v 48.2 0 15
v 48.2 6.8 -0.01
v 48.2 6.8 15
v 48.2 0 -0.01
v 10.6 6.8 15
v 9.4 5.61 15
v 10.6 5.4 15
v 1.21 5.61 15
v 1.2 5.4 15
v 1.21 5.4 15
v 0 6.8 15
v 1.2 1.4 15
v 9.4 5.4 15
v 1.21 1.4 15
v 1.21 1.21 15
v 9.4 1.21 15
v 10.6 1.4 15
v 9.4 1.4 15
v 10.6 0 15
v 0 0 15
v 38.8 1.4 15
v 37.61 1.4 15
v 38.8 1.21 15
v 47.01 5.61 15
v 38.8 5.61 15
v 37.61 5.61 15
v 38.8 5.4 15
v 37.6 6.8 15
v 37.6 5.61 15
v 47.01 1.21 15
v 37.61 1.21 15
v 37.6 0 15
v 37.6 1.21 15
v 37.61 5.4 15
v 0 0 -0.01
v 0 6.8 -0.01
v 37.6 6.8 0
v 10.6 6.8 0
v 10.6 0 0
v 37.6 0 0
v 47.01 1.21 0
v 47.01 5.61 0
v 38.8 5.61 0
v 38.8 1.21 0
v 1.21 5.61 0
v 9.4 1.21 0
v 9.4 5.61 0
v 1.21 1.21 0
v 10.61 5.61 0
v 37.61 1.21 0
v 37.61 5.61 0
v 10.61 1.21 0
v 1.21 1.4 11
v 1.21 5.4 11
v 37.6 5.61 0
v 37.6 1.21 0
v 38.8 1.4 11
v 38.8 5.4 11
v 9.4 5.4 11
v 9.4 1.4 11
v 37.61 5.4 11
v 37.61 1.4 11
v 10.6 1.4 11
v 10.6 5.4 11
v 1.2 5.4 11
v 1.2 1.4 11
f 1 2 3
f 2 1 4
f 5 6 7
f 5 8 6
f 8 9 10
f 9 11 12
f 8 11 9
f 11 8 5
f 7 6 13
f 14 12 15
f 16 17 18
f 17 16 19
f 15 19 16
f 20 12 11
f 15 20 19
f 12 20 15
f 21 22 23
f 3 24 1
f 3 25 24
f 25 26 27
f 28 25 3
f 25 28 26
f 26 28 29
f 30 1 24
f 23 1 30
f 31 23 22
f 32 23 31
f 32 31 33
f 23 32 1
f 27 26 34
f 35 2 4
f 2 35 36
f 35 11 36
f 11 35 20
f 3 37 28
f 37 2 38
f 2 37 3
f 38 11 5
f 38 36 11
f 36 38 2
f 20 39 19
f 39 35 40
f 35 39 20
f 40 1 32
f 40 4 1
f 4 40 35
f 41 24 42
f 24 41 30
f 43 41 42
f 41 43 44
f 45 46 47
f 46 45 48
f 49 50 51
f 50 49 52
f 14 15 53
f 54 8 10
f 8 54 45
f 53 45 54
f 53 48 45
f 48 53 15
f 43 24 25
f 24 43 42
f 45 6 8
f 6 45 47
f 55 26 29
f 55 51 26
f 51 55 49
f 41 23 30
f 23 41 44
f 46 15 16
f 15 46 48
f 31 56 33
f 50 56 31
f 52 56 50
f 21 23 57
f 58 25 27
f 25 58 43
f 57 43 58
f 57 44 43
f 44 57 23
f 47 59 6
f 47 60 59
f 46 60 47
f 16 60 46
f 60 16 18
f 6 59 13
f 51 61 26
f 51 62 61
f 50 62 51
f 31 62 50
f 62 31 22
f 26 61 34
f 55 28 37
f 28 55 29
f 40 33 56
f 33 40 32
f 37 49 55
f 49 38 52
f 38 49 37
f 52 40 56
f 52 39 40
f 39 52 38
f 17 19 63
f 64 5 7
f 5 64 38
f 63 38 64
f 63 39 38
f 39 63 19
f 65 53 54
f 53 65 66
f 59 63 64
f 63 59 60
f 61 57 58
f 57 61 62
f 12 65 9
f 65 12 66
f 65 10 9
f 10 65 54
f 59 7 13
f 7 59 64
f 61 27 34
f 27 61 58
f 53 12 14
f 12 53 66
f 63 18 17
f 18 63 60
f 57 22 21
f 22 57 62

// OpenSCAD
// file: ../Base/Boxes.scad
// Fischertechnik Box Foundation
// Pre-designed Boxes

use <Constants.scad>

include <PlacementOptions.scad>

box190Width = 190;
box190Depth = 130;
box130Width = 130;
box130Depth = 95;

// Values are from an original ec3 box
topBottomDifference = 1.5;
outerHeight = 40;
baseThickness = 1.8;
innerHeight = outerHeight - baseThickness;
stackExcess = 5.7;
radius = 3.5;
wallThickness = 1.5;
tolerance = 0.2;

boxWallThickness = wallThickness;
boxBaseThickness = baseThickness;
boxWebWidth = 3.0;

// getBoxWallThickness()
// Gets the wall thickness of a Fischertechnik Box
function getBoxWallThickness() = boxWallThickness;

// getBoxUsageHeight(height = 38.2)
// Gets the usable height of a Fischertechnik box
// height = Outer height of the box from the bottom to the upper edge.
function getBoxUsageHeight(height = outerHeight) = height - baseThickness - stackExcess;

// getBoxInnerHeight()
// Gets the inner height of a Fischertechnik box, including the stack excess
function getBoxInnerHeight() = innerHeight;

// getBoxBaseThickness()
// Gets the thickness of the Fischertechnik box base.
function getBoxBaseThickness() = boxBaseThickness;

// getBoxWebWidth()
// Gets the width of a box web
function getBoxWebWidth() = boxWebWidth;

// getBox190Space()
// Gets the usable inner space of a Box 190 as an x/y-list
function getBox190Space() = [
    box190Width - 2*getBoxWallThickness() - topBottomDifference, 
    box190Depth - 2*getBoxWallThickness() - topBottomDifference ];

// RoundedCornerPlate(width, depth, height, radius)
// Creates a body plate with rounded corners for a box. Used
// also to create the complete box with the hull module.
// width = Width of the plate
// depth = depth of the plate 
// height = thickness of the plate
// radius = radius of the rounded corner
module RoundedCornerPlate(width, depth, height, radius) {
    translate([radius, radius])
    hull() {
        w = width-2*radius;
        d = depth-2*radius;
        cube([w, d, height]);
        cylinder(height, r=radius, $fn=getFragments());
        translate([w, 0])
            cylinder(height, r=radius, $fn=getFragments());
        translate([w, d])
            cylinder(height, r=radius, $fn=getFragments());
        translate([0, d])
            cylinder(height, r=radius, $fn=getFragments());
    }
}

// BoxBase(width, depth)
// Creates an empty stackable Fischertechnik compatible box
// width = Outer width of the box (190, 130, ...)
// depth = Outer depth of the box (130, 95, ...)

module BoxBase(width, depth, height=outerHeight) {    
    thinPlate = 0.01;

    innerHeight = height - baseThickness;    
    
    module Body(tolerance=tolerance) {
        hull() {
            // Bottom with tolerance to fit into the original boxes when stacked
            translate([-wallThickness+tolerance, -wallThickness+tolerance, -baseThickness])
                RoundedCornerPlate(width-topBottomDifference-2*tolerance, depth-topBottomDifference-2*tolerance, thinPlate, radius);
            
            // Top
            translate([-wallThickness-topBottomDifference/2, -wallThickness-topBottomDifference/2, innerHeight-thinPlate])
                RoundedCornerPlate(width, depth, thinPlate, radius);
         }
    }

    module Cutoff() {
        hull() {
            coWidth = width - 2*wallThickness;
            coDepth = depth - 2*wallThickness;
            
            // Bottom
            RoundedCornerPlate(coWidth-topBottomDifference, coDepth-topBottomDifference, thinPlate, radius);

            // Top
            translate([-topBottomDifference/2, -topBottomDifference/2, innerHeight+thinPlate]) 
                RoundedCornerPlate(coWidth, coDepth, thinPlate, radius);
        }
    }
    
    difference() {        
        Body();
        Cutoff();
        stackOffset = innerHeight - stackExcess;
        translate([0, 0, stackOffset + baseThickness])
            Body(tolerance=0);
    }
}

// Creates the Fischertechnik empty box 130x190 mm and places it at position 0,0
// 190x130 are the outer sizes, the inner space is slightly smaller. Use getBox190Space() to get the inner sizes.
// The box is positioned that the usable inner space is at the 0,0,0 position.

module Box190() {
    BoxBase(box190Width, box190Depth);
}

// Gets the usable inner space of a Box 130 as an x/y-list
function getBox130Space() = [
    box130Width - 2*getBoxWallThickness() - topBottomDifference, 
    box130Depth - 2*getBoxWallThickness() - topBottomDifference ];

// Creates the Fischertechnik empty box 95x130 mm and places it at position 0,0
// 190x130 are the outer sizes, the inner space is slightly smaller. Use getBox190Space() to get the inner sizes.
// The box is positioned that the usable inner space is at the 0,0,0 position.

module Box130() {
    BoxBase(box130Width, box130Depth);
}

// Creates a web at the specified box walls
// corner 0 = LowerLeft, 1 = UpperLeft, 2 = UpperRight, 3 = LowerRight
// side 0 = LeftOfCorner, 1 = RightOfCorner
// distance = Distance in mm from the corner
// boxSpace = inner width and depth of the box (default: Box 190)
// webWidth = length of the web (default is 3 mms)
// webThickness = thickness of the web (default is 1 mm)
// height = Height of the web (standard is getBoxUsageHeight())
// sink = How much of the web is sunk into the wall

module BoxWeb(
    corner, 
    side, 
    distance, 
    boxSpace=getBox190Space(), 
    webWidth=getBoxWebWidth(), 
    webThickness=1.0, 
    height=getBoxUsageHeight(),
    sink = getBoxWallThickness()/2) {
    width = (corner % 2 == 0) ? 
            (side == LeftOfCorner ? webWidth : webThickness) :
            (side == LeftOfCorner ? webThickness : webWidth);

    depth = (corner % 2 == 0) ? 
            (side == RightOfCorner ? webWidth : webThickness) :
            (side == RightOfCorner ? webThickness : webWidth);
    
    xDiff = corner == LowerLeft ? 
                (side == LeftOfCorner ? -sink : distance) :
            (corner == UpperLeft ?                
                (side == LeftOfCorner ? distance : -sink) :
            (corner == UpperRight ?
                (side == LeftOfCorner ? boxSpace.x-webWidth+sink : boxSpace.x-distance-webThickness) :
                (side == LeftOfCorner ? boxSpace.x-distance-webThickness: boxSpace.x-webWidth+sink)));

    yDiff = corner == LowerLeft ? 
                (side == RightOfCorner ? -sink : distance) :
            (corner == UpperLeft ?
                (side == RightOfCorner ? boxSpace.y-distance-webThickness : boxSpace.y-webWidth+sink) :
            (corner == UpperRight ?
                (side == RightOfCorner ? boxSpace.y-webWidth+sink : boxSpace.y-distance-webThickness) :
                (side == RightOfCorner ? distance : -sink)));
    
    translate([xDiff, yDiff, -getExcess()])
        cube([width, depth, height + 2*getExcess()]);
}
// file: ../Base/Rotation.scad
// Fischertechnik Box Foundation
// Geometry Helpers Rotation

include <PlacementOptions.scad>

// getRotatedSpace(space, rotation=NoRotation)
// Rotates the space dependent on the specified rotation

function getRotatedSpace(space, rotation=NoRotation) = [
    (rotation == Rotate90 || rotation == Rotate270) ? space.y : space.x,
    (rotation == Rotate90 || rotation == Rotate270) ? space.x : space.y
];

// Rotates the given space around the fixed left lower corner
// space = the space the children needs as width/depth list [width,depth]
// rotation = 0 Rotate0 degrees, 1 Rotate90 degrees, 2 Rotate180 degrees, 3 Rotate270 degrees (equivalent to -90)

module RotateFix(space, rotation=NoRotation) {
    dy = (rotation == Rotate0 || rotation == Rotate270) ? 0 :
        (rotation == Rotate90) ? space.x :
        space.y;
    dx = (rotation < Rotate180) ? 0 :
        (rotation == Rotate180) ? space.x :
        space.y;
    
    translate([dx, dy, 0])
        rotate([0, 0, rotations[rotation]])
            children();
}
// file: ../Base/Alignment.scad
// Fischertechnik Box Foundation
// Geometry Helpers Alignment

include <PlacementOptions.scad>

// getAlignedX(elementWidth, spaceWidth, align=AlignRight, offset=0)
// Gets the aligned X offset of an element with the given
// width in the given space.
// elementWidth = The width of the element to positon
// spaceWidth = The space where the element should be aligned
// align = 0 AlignLeft, 1 AlignCenter, 2 AlignRight
// offset = an optional offset from the aligned position. When
// aligned left or centered, then positive values are in X direction.
// When aligned right then positive values are in negative X direction.

function getAlignedX(elementWidth, spaceWidth, align=AlignRight, offset=0) =
    (align == AlignLeft) ?
        offset :
        ((align == AlignCenter) ?
        (spaceWidth - elementWidth)/2 + offset :
        spaceWidth - offset - elementWidth);

// getAlignedY(elementDepth, spaceDepth, align=AlignTop, offset=0)
// Gets the aligned Y offset of an element with the given
// depth in the given space.
// elementDepth = The depth of the element to positon
// spaceDepth = The space where the element should be aligned
// align = 0 AlignBottom, 1 AlignCenter, 2 AlignTop
// offset = an optional offset from the aligned position. When
// aligned bottom or centered, then positive values are in Y direction.
// When aligned top then positive values are in negative Y direction.

function getAlignedY(elementDepth, spaceDepth, align=AlignTop, offset=0) =
    (align == AlignBottom) ?
        offset :
        ((align == AlignCenter) ?
        (spaceDepth - elementDepth)/2 + offset :
        spaceDepth - offset - elementDepth);
// file: ../Base/PlacementOptions.scad
// Fischertechnik Box Foundation
// Placement Options

// Alignment
NoAlign = 0;
AlignLeft = 1;
AlignBottom = 2;
AlignCenter = 3;
AlignRight = 4;
AlignTop = 5;

// Element rotation degree steps
rotations = [0, -90, -180, -270];

// Rotation
NoRotation = 0;
Rotate0 = 0;
Rotate90 = 1;
Rotate180 = 2;
Rotate270 = 3;

// Docking (seen from above)
NoDock = -1;
DockLeft = 0;
DockTop = 1;
DockRight = 2;
DockCorner = 2;
DockBottom = 3;

// Web corners
LowerLeft = 0;
UpperLeft = 1;
UpperRight = 2;
LowerRight = 3;

// Web position relative to corner
LeftOfCorner = 0;
RightOfCorner = 1;

// Rails direction
Horizontal = true;
Vertical = false;
// file: ../Base/Placement.scad
// Fischertechnik Box Foundation
// Geometry Helpers Placement

use <Constants.scad>
use <Alignment.scad>
use <Rotation.scad>
use <Boxes.scad>

include <PlacementOptions.scad>

// Place(x=0, y=0, elementSpace=[0,0], alignX=AlignLeft, alignY=AlignBottom, rotation=Rotate0, boxSpace=getBox190Space())
// Places the child at the specified position
// y = Y-Position. This is a relative position when an X aligment is specified.
// x = X-Position. This is a relative position when an Y aligment is specified.
// elementSpace = space of the element to be placed [x,y]
// alignX = -1=NoAlign, 0 AlignLeft, 1 AlignCenter, 3 AlignRight (elementSpace and boxSpace required!)
// alignY = -1=NoAlign, 2 AlignBottom, 1 AlignCenter, 4 AlignTop (elementSpace and boxSpace required!)
// rotation = 0 Rotate0 0 degrees, 1 Rotate90 90 degrees, 
// 2 Rotate180 180 degrees, 3 Rotate270 270 degrees (equivalent to -90)
// boxSpace = Inner space of the box where the placement occurs [x,y] - default is Box 190x130 inner space

module Place(x=0, y=0, elementSpace=[0,0], 
  alignX=AlignLeft, alignY=AlignBottom, 
  rotation=NoRotation, boxSpace=getBox190Space()) {

    module Position(x, y, space, rotation=Rotate0) {
        translate([x, y, 0])
            RotateFix(space, rotation)
                children();
    }

    space = getRotatedSpace(elementSpace, rotation);
    alignedX = getAlignedX(space.x, boxSpace.x, alignX, x);
    alignedY = getAlignedY(space.y, boxSpace.y, alignY, y);
    Position(alignedX, alignedY, elementSpace, rotation)
        children();
}

// Center(space=getBox130Space(), elementSpace=[0,0])
// space = Space where the children is centered. For cylinder use centered=true and no elementSpace.
// elementSpace = space of the element to be centered [x,y]

module Center(space=getBox190Space(), elementSpace=[0,0]) {
    Place(elementSpace=elementSpace, boxSpace=space, alignX=AlignCenter, alignY=AlignCenter)
        children();
}

// CenterHorizontal(width=0, y=0, offset=0, space=getBox130Space())
// width = Width of the element to be placed.
// y = Y position of the element
// offset = Offset from the center position (negative will be left of the center)
// space = Space where the element is placed

module CenterHorizontal(width=0, y=0, offset=0, space=getBox190Space()) {
    Place(x=offset, y=y, elementSpace=[width, 0], boxSpace=space, alignX=AlignCenter)
        children(0);
}

// CenterVertical(depth=0, x=0, offset=0, space=getBox130Space())
// depth = Depth of the element to be placed.
// x = X position of the element
// offset = Offset from the center position (negative will be down of the center)
// space = Space where the element is placed

module CenterVertical(depth=0, x=0, offset=0, space=getBox190Space()) {
    Place(x=x, y=offset, elementSpace=[0, depth], boxSpace=space, alignY=AlignCenter)
        children(0);
}

// getIsVertical(align)
// True if the specified alignment needs a vertical orientation for a divider (AlignRight, AlignLeft)

function getIsVertical(align) = (align == AlignRight || align == AlignLeft);

// getIsHorizontal(align)
// True if the specified alignment needs a horizontal orientation for a divider (AlignTop, AlignBottom)

function getIsHorizontal(align) = (align == AlignTop || align == AlignBottom);
// file: ../Base/Constants.scad
// Fischertechnik Box Foundation
// Constants

// Constant values necessary for multiple elements

// Base constants
dividerThickness = 1.2;
excess = 0.01;
fragments = 90;
tolerance = 0.8;

// Gets the thickness of a divider 
function getDividerThickness() = dividerThickness;

// Gets the excess that is used to merge walls into each other
function getExcess() = excess;

// Gets amount of fragments of a cylinder
function getFragments() = fragments;

// Gets the inner tolerance of a frame to each side
function getTolerance() = tolerance;


// Fischertechnik specific constants
axisDiameter = 4;
axisBottomDiameter = axisDiameter + 1;
axisTolerance = 0.2;
axisLockingLength = 8;

// Gets axis diameter of Fischertechnik axis
function getAxisDiameter() = axisDiameter;

// Gets axis diameter tolerance (subtracted for element axis)
function getAxisTolerance() = axisTolerance;

// Gets the axis diameter for standing axis
function getStandAxisDiameter() = getAxisDiameter() - getAxisTolerance();

// Gets axis bottom diameter for thicker part at the bottom
function getAxisBottomDiameter() = axisBottomDiameter;

// Gets the lengthh of the locking part of a locking axis
function getAxisLockingLength() = axisLockingLength;

// Studs

studHeight = 2.5;
studTolerance = 0.2;
studRailDistance = 9;   // as in ft 50

// gets the height of a connecting stud
function getStudHeight() = studHeight;

// gets the connecting stud height tolerance
function getStudTolerance() = studTolerance;

// gets the default rail distance for studs
function getStudRailDistance() = studRailDistance;

// Dockable Frame with Edge

standardEdgeDistance = 2.5;
standardWebDistance = 11.5;
standardCornerLength = 15;

// gets the standard distance to the wall of the box for dockable frames with webs
function getStandardEdgeDistance() = standardEdgeDistance;

// gets the standard distance of each web to the corner of the dockable frame
function getStandardWebDistance() = standardWebDistance;

// gets the standard length of the corner walls of a dockable frame
function getStandardCornerLength() = standardCornerLength;

// Tubes

tubeWallFactor = 0.8;

// gets the wall thickness of a tube.
function getTubeWallThickness() = tubeWallFactor * getDividerThickness();

// Small Parts and Divider Frame

smallPartsFrameHeight = 20;

// gets the frame height for docked small parts boxes.
function getSmallPartsFrameHeight() = smallPartsFrameHeight;

// Hubs

hubRingDiameter = 19.5;
hubRingLevelDiameter = 21;

// gets the diameter of a tube matching the inner ring of a wheel
function getHubRingDiameter() = hubRingDiameter;

// gets the diameter of a hub tube with a thicker diameter
function getHubRingLevelDiameter() = hubRingLevelDiameter;

// Struts

strutAddLength = 9.0;
strutDepth = 8.0;

// gets the full length of a strut
function getFullStrutLength(length) = length + strutAddLength;

// gets the radius of the end of a strut
function getStrutEndRadius() = strutAddLength / 2;

// gets the the depth of a strut
function getStrutDepth() = strutDepth;

// Propeller

propellerAxisDiameter = 7.0;
propellerAxisTolerance = 0.2;

// gets the propeller axis outer diameter
function getPropellerAxisDiameter() = propellerAxisDiameter;

// gets the propeller axis printing tolerance
function getPropellerAxisTolerance() = propellerAxisTolerance;
// main file
// Fischertechnik Box Library
// Frame for single 45 mm Locking Axis
// 35064

use <../ModelBase/Complex.scad>

/* [Element Parameters] */
count = 1;

/* [Hidden] */
length = 45;

// getFrameAxis45Space(count=1)
// Gets the width (.x) and depth (.y) of the axis frame.
// count = Count of axis

function getFrameAxis45Space(count=1) = getFrameAxisSpace(length, count);

// FrameAxis45(count=1)
// Axis holder for a single 50 mm axis.
// count = Count of axis

module FrameAxis45(count=1) {
    FrameAxis(length, count);
}

// Test
color("lightgray")
FrameAxis45(count);
